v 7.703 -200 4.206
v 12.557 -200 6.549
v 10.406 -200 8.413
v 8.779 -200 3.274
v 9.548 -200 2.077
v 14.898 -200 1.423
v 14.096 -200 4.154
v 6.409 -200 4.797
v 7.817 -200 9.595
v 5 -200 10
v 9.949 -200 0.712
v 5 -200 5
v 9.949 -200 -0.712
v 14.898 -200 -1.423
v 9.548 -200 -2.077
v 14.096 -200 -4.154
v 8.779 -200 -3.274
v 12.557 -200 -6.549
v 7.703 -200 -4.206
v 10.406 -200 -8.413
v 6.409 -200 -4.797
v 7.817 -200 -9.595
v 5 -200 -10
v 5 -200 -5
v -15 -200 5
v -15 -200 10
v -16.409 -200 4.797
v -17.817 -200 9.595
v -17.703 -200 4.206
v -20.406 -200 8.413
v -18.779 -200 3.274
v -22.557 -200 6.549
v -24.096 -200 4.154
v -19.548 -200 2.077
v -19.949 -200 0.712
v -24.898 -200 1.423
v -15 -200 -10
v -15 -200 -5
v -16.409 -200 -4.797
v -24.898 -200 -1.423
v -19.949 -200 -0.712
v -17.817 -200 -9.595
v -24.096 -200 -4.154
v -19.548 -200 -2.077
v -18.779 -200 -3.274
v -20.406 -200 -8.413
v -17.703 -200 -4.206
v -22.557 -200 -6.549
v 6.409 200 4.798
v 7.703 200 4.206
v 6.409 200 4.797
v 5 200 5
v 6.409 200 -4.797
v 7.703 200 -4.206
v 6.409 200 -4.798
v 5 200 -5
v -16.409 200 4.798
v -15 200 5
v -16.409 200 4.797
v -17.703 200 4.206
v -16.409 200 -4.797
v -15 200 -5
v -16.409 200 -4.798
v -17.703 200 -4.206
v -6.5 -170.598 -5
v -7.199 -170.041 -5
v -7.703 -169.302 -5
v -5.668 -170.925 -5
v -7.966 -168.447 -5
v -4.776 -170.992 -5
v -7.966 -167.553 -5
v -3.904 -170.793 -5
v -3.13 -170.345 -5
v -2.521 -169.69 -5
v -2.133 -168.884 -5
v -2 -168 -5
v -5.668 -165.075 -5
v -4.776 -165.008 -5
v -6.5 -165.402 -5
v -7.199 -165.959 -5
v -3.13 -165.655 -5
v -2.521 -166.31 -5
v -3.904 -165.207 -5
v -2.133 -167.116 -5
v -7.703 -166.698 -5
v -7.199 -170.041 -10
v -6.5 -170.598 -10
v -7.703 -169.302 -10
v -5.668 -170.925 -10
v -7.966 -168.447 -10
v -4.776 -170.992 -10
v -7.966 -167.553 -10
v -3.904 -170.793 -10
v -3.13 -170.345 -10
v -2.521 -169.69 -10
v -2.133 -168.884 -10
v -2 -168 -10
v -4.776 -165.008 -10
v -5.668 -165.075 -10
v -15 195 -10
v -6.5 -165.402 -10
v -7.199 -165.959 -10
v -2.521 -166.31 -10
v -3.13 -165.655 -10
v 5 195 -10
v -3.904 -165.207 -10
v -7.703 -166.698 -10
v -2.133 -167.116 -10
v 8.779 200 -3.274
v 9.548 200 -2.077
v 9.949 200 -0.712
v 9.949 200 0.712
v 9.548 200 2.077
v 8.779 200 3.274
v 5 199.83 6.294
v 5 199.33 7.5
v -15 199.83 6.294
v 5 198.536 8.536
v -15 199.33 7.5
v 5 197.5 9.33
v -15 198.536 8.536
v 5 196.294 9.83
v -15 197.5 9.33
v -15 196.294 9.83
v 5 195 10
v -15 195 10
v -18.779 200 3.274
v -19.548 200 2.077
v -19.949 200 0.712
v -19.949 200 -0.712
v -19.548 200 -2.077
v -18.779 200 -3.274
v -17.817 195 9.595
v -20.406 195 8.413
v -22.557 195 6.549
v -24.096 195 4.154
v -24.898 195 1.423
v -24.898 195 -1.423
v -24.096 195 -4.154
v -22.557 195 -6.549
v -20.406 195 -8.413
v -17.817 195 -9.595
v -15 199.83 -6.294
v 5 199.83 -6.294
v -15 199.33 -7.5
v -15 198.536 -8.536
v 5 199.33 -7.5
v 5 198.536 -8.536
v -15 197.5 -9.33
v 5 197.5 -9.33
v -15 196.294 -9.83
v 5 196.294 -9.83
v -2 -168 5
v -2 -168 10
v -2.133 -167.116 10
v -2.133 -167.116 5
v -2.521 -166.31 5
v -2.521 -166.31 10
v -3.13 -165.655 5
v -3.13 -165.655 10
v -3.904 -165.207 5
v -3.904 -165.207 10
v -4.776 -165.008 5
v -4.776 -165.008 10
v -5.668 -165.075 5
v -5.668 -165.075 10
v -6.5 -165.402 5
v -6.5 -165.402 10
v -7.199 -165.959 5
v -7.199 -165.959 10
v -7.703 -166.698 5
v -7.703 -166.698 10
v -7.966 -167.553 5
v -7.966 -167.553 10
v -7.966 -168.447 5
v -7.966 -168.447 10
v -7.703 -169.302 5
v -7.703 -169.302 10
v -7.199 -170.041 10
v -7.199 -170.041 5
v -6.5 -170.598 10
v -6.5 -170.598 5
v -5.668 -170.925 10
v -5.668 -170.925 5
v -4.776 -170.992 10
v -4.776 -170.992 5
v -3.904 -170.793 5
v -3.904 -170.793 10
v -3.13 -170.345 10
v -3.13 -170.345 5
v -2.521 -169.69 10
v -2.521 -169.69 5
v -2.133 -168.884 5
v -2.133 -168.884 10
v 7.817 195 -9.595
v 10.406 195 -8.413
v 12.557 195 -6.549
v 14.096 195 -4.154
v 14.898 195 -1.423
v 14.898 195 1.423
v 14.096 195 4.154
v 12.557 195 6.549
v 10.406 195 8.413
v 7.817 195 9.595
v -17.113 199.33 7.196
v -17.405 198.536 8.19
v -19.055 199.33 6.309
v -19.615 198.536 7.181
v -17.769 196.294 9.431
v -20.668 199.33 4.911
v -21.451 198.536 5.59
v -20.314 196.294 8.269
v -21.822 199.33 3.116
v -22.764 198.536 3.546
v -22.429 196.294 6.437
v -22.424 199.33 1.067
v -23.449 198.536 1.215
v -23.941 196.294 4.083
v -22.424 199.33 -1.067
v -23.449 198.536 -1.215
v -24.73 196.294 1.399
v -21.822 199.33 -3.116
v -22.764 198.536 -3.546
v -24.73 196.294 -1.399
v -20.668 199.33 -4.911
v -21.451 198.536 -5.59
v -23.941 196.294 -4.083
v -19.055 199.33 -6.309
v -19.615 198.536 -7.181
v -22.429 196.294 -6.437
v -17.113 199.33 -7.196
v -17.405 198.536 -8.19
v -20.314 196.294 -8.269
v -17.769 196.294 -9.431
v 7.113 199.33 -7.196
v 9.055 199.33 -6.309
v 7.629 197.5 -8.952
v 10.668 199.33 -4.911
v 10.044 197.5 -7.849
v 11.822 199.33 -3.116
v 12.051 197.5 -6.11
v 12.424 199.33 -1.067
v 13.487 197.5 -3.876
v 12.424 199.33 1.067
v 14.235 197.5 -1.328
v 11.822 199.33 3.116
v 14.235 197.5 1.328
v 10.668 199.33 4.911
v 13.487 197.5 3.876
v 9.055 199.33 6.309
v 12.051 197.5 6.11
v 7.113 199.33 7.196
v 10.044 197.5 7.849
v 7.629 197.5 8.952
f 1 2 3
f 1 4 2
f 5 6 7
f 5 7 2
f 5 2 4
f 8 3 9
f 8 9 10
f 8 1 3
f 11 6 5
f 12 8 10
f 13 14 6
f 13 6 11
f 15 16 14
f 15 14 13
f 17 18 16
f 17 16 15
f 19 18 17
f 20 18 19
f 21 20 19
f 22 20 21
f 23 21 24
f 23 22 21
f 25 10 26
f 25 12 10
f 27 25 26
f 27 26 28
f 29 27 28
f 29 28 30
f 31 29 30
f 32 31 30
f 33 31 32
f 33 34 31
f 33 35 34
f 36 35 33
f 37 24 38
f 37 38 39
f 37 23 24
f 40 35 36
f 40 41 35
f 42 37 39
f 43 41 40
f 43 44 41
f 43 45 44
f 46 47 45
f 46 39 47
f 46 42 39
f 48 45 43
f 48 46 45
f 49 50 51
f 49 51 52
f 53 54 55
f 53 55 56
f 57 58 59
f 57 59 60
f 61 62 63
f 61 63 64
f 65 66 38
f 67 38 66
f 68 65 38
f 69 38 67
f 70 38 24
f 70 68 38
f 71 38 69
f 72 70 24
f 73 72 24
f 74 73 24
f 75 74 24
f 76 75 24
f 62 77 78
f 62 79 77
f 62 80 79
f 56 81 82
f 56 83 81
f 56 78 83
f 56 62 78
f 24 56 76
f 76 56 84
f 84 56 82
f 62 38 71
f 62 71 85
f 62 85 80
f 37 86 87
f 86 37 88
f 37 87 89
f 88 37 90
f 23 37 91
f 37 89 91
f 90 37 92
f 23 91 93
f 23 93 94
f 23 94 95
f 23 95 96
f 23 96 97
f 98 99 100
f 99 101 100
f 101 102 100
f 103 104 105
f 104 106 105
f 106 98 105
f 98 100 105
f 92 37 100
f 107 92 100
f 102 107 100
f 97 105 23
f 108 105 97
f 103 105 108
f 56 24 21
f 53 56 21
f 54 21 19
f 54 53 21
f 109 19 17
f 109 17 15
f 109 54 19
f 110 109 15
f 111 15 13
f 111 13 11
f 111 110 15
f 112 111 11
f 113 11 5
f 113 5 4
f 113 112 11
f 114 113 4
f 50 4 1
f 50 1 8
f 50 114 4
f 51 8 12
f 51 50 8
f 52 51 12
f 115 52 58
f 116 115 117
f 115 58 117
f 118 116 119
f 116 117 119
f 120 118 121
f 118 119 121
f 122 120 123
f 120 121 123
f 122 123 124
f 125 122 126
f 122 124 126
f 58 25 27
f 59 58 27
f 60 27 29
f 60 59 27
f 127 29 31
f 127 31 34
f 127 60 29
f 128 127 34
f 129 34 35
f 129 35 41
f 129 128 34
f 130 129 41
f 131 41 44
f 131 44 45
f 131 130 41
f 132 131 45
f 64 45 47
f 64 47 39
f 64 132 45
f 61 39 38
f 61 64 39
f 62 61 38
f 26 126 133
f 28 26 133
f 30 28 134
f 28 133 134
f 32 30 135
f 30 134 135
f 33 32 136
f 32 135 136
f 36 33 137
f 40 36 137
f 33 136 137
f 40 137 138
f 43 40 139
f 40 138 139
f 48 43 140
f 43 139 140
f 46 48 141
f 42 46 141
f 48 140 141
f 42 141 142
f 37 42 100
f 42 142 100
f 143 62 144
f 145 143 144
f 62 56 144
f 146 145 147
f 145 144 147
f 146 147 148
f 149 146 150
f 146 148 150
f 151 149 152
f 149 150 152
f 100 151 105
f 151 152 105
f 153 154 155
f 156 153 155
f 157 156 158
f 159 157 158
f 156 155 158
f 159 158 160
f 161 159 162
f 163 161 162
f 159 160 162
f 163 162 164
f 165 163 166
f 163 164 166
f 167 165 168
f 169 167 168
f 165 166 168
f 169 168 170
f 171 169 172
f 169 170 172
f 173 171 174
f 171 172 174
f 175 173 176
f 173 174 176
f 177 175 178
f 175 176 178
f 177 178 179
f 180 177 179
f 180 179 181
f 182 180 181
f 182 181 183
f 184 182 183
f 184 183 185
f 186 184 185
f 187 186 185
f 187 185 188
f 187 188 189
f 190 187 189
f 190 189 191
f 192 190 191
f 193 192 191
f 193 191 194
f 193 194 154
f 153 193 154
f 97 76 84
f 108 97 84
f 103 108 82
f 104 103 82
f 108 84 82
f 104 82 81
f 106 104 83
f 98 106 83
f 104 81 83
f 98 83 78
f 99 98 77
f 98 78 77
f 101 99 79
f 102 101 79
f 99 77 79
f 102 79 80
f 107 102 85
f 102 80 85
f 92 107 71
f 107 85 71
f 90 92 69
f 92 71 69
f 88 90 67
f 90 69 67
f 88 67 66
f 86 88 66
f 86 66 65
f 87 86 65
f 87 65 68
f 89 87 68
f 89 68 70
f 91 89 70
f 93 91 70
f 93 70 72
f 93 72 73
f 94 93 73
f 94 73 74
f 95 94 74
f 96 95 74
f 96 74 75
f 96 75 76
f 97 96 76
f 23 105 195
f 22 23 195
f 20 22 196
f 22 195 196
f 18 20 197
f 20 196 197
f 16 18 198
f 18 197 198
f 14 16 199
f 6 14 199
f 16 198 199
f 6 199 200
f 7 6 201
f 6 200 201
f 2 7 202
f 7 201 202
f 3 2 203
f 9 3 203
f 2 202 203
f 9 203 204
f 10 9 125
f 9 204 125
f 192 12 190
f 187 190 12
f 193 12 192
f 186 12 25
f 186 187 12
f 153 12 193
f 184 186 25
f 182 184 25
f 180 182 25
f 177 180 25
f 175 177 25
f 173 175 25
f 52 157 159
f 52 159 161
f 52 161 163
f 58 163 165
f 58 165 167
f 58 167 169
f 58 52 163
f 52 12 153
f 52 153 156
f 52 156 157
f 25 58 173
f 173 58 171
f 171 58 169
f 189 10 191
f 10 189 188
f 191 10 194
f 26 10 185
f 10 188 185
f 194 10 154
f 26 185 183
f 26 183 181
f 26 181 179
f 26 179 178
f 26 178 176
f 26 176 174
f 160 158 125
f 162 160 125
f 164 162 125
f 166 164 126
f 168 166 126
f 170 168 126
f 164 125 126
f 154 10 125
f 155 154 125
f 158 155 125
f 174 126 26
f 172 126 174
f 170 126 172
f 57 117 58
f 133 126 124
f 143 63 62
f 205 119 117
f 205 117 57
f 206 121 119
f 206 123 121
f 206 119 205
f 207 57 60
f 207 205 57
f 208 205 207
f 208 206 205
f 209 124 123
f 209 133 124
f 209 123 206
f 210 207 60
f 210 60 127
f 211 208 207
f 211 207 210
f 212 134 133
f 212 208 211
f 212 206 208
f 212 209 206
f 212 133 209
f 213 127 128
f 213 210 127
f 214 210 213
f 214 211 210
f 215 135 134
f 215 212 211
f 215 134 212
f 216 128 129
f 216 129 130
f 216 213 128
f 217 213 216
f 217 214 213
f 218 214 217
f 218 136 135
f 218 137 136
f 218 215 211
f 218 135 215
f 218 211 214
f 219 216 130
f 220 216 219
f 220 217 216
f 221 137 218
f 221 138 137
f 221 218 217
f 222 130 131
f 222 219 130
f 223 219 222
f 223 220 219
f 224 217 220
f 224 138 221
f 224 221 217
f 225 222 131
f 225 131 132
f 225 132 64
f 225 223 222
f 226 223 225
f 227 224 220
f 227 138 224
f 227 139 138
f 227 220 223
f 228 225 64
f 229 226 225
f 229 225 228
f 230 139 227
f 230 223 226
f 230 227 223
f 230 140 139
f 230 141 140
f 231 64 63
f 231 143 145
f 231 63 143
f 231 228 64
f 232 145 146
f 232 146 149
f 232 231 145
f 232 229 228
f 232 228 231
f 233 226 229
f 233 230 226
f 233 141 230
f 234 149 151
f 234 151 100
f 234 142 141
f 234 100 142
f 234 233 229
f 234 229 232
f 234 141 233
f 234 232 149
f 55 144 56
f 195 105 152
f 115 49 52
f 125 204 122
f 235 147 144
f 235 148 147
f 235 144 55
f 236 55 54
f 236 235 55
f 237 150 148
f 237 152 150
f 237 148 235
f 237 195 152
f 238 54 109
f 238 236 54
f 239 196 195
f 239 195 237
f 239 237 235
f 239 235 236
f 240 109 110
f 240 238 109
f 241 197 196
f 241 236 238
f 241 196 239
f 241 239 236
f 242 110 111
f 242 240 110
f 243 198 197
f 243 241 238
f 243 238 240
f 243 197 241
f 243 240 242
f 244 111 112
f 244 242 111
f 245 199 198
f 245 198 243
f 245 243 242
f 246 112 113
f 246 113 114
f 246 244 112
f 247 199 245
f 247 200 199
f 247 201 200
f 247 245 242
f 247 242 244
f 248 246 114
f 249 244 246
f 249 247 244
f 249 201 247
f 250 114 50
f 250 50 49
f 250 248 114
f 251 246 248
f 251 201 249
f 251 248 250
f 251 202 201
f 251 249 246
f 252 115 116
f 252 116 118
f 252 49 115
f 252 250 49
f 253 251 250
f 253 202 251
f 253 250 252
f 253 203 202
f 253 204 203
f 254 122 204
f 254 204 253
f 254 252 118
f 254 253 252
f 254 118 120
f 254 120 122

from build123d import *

# Parameters (mm, degrees)
BOSS_EXTRUDE1_DEPTH = 200
SKETCH2_R           = 3
CUT_EXTRUDE1_DEPTH  = 203.546291005
FILLET1_R           = 5


with BuildPart() as part:
    # Sketch1 → Boss-Extrude1 (new, symmetric)
    with BuildSketch(Plane(origin=(0, 0, 0), x_dir=(1, 0, 0), z_dir=(0, 1, 0))):
        with BuildLine():
            Line((-15, 10), (5, 10))
            ThreePointArc((5, 10), (15, 0), (5, -10))
            Line((5, -10), (-15, -10))
            ThreePointArc((-15, -10), (-25, 0), (-15, 10))
        make_face()
        with BuildLine():
            Line((-15, 5), (5, 5))
            ThreePointArc((5, 5), (10, 0), (5, -5))
            Line((5, -5), (-15, -5))
            ThreePointArc((-15, -5), (-20, 0), (-15, 5))
        make_face(mode=Mode.SUBTRACT)
    extrude(amount=BOSS_EXTRUDE1_DEPTH, both=True)

    # Sketch2 → Cut-Extrude1 (cut, through all)
    with BuildSketch(Plane.XY.offset(10)):
        with Locations((-5, -168)):
            Circle(SKETCH2_R)
    extrude(amount=-CUT_EXTRUDE1_DEPTH, mode=Mode.SUBTRACT)

    # Fillet1
    fillet1_edges = [part.edges().sort_by_distance(p)[0] for p in [
        (15, 200, 0),
        (-5, 200, -10),
        (-25, 200, 0),
        (-5, 200, 10),
    ]]
    fillet(fillet1_edges, radius=FILLET1_R - 0.0001)  # a hair under: the kernel refuses the full size


solid = part.part
